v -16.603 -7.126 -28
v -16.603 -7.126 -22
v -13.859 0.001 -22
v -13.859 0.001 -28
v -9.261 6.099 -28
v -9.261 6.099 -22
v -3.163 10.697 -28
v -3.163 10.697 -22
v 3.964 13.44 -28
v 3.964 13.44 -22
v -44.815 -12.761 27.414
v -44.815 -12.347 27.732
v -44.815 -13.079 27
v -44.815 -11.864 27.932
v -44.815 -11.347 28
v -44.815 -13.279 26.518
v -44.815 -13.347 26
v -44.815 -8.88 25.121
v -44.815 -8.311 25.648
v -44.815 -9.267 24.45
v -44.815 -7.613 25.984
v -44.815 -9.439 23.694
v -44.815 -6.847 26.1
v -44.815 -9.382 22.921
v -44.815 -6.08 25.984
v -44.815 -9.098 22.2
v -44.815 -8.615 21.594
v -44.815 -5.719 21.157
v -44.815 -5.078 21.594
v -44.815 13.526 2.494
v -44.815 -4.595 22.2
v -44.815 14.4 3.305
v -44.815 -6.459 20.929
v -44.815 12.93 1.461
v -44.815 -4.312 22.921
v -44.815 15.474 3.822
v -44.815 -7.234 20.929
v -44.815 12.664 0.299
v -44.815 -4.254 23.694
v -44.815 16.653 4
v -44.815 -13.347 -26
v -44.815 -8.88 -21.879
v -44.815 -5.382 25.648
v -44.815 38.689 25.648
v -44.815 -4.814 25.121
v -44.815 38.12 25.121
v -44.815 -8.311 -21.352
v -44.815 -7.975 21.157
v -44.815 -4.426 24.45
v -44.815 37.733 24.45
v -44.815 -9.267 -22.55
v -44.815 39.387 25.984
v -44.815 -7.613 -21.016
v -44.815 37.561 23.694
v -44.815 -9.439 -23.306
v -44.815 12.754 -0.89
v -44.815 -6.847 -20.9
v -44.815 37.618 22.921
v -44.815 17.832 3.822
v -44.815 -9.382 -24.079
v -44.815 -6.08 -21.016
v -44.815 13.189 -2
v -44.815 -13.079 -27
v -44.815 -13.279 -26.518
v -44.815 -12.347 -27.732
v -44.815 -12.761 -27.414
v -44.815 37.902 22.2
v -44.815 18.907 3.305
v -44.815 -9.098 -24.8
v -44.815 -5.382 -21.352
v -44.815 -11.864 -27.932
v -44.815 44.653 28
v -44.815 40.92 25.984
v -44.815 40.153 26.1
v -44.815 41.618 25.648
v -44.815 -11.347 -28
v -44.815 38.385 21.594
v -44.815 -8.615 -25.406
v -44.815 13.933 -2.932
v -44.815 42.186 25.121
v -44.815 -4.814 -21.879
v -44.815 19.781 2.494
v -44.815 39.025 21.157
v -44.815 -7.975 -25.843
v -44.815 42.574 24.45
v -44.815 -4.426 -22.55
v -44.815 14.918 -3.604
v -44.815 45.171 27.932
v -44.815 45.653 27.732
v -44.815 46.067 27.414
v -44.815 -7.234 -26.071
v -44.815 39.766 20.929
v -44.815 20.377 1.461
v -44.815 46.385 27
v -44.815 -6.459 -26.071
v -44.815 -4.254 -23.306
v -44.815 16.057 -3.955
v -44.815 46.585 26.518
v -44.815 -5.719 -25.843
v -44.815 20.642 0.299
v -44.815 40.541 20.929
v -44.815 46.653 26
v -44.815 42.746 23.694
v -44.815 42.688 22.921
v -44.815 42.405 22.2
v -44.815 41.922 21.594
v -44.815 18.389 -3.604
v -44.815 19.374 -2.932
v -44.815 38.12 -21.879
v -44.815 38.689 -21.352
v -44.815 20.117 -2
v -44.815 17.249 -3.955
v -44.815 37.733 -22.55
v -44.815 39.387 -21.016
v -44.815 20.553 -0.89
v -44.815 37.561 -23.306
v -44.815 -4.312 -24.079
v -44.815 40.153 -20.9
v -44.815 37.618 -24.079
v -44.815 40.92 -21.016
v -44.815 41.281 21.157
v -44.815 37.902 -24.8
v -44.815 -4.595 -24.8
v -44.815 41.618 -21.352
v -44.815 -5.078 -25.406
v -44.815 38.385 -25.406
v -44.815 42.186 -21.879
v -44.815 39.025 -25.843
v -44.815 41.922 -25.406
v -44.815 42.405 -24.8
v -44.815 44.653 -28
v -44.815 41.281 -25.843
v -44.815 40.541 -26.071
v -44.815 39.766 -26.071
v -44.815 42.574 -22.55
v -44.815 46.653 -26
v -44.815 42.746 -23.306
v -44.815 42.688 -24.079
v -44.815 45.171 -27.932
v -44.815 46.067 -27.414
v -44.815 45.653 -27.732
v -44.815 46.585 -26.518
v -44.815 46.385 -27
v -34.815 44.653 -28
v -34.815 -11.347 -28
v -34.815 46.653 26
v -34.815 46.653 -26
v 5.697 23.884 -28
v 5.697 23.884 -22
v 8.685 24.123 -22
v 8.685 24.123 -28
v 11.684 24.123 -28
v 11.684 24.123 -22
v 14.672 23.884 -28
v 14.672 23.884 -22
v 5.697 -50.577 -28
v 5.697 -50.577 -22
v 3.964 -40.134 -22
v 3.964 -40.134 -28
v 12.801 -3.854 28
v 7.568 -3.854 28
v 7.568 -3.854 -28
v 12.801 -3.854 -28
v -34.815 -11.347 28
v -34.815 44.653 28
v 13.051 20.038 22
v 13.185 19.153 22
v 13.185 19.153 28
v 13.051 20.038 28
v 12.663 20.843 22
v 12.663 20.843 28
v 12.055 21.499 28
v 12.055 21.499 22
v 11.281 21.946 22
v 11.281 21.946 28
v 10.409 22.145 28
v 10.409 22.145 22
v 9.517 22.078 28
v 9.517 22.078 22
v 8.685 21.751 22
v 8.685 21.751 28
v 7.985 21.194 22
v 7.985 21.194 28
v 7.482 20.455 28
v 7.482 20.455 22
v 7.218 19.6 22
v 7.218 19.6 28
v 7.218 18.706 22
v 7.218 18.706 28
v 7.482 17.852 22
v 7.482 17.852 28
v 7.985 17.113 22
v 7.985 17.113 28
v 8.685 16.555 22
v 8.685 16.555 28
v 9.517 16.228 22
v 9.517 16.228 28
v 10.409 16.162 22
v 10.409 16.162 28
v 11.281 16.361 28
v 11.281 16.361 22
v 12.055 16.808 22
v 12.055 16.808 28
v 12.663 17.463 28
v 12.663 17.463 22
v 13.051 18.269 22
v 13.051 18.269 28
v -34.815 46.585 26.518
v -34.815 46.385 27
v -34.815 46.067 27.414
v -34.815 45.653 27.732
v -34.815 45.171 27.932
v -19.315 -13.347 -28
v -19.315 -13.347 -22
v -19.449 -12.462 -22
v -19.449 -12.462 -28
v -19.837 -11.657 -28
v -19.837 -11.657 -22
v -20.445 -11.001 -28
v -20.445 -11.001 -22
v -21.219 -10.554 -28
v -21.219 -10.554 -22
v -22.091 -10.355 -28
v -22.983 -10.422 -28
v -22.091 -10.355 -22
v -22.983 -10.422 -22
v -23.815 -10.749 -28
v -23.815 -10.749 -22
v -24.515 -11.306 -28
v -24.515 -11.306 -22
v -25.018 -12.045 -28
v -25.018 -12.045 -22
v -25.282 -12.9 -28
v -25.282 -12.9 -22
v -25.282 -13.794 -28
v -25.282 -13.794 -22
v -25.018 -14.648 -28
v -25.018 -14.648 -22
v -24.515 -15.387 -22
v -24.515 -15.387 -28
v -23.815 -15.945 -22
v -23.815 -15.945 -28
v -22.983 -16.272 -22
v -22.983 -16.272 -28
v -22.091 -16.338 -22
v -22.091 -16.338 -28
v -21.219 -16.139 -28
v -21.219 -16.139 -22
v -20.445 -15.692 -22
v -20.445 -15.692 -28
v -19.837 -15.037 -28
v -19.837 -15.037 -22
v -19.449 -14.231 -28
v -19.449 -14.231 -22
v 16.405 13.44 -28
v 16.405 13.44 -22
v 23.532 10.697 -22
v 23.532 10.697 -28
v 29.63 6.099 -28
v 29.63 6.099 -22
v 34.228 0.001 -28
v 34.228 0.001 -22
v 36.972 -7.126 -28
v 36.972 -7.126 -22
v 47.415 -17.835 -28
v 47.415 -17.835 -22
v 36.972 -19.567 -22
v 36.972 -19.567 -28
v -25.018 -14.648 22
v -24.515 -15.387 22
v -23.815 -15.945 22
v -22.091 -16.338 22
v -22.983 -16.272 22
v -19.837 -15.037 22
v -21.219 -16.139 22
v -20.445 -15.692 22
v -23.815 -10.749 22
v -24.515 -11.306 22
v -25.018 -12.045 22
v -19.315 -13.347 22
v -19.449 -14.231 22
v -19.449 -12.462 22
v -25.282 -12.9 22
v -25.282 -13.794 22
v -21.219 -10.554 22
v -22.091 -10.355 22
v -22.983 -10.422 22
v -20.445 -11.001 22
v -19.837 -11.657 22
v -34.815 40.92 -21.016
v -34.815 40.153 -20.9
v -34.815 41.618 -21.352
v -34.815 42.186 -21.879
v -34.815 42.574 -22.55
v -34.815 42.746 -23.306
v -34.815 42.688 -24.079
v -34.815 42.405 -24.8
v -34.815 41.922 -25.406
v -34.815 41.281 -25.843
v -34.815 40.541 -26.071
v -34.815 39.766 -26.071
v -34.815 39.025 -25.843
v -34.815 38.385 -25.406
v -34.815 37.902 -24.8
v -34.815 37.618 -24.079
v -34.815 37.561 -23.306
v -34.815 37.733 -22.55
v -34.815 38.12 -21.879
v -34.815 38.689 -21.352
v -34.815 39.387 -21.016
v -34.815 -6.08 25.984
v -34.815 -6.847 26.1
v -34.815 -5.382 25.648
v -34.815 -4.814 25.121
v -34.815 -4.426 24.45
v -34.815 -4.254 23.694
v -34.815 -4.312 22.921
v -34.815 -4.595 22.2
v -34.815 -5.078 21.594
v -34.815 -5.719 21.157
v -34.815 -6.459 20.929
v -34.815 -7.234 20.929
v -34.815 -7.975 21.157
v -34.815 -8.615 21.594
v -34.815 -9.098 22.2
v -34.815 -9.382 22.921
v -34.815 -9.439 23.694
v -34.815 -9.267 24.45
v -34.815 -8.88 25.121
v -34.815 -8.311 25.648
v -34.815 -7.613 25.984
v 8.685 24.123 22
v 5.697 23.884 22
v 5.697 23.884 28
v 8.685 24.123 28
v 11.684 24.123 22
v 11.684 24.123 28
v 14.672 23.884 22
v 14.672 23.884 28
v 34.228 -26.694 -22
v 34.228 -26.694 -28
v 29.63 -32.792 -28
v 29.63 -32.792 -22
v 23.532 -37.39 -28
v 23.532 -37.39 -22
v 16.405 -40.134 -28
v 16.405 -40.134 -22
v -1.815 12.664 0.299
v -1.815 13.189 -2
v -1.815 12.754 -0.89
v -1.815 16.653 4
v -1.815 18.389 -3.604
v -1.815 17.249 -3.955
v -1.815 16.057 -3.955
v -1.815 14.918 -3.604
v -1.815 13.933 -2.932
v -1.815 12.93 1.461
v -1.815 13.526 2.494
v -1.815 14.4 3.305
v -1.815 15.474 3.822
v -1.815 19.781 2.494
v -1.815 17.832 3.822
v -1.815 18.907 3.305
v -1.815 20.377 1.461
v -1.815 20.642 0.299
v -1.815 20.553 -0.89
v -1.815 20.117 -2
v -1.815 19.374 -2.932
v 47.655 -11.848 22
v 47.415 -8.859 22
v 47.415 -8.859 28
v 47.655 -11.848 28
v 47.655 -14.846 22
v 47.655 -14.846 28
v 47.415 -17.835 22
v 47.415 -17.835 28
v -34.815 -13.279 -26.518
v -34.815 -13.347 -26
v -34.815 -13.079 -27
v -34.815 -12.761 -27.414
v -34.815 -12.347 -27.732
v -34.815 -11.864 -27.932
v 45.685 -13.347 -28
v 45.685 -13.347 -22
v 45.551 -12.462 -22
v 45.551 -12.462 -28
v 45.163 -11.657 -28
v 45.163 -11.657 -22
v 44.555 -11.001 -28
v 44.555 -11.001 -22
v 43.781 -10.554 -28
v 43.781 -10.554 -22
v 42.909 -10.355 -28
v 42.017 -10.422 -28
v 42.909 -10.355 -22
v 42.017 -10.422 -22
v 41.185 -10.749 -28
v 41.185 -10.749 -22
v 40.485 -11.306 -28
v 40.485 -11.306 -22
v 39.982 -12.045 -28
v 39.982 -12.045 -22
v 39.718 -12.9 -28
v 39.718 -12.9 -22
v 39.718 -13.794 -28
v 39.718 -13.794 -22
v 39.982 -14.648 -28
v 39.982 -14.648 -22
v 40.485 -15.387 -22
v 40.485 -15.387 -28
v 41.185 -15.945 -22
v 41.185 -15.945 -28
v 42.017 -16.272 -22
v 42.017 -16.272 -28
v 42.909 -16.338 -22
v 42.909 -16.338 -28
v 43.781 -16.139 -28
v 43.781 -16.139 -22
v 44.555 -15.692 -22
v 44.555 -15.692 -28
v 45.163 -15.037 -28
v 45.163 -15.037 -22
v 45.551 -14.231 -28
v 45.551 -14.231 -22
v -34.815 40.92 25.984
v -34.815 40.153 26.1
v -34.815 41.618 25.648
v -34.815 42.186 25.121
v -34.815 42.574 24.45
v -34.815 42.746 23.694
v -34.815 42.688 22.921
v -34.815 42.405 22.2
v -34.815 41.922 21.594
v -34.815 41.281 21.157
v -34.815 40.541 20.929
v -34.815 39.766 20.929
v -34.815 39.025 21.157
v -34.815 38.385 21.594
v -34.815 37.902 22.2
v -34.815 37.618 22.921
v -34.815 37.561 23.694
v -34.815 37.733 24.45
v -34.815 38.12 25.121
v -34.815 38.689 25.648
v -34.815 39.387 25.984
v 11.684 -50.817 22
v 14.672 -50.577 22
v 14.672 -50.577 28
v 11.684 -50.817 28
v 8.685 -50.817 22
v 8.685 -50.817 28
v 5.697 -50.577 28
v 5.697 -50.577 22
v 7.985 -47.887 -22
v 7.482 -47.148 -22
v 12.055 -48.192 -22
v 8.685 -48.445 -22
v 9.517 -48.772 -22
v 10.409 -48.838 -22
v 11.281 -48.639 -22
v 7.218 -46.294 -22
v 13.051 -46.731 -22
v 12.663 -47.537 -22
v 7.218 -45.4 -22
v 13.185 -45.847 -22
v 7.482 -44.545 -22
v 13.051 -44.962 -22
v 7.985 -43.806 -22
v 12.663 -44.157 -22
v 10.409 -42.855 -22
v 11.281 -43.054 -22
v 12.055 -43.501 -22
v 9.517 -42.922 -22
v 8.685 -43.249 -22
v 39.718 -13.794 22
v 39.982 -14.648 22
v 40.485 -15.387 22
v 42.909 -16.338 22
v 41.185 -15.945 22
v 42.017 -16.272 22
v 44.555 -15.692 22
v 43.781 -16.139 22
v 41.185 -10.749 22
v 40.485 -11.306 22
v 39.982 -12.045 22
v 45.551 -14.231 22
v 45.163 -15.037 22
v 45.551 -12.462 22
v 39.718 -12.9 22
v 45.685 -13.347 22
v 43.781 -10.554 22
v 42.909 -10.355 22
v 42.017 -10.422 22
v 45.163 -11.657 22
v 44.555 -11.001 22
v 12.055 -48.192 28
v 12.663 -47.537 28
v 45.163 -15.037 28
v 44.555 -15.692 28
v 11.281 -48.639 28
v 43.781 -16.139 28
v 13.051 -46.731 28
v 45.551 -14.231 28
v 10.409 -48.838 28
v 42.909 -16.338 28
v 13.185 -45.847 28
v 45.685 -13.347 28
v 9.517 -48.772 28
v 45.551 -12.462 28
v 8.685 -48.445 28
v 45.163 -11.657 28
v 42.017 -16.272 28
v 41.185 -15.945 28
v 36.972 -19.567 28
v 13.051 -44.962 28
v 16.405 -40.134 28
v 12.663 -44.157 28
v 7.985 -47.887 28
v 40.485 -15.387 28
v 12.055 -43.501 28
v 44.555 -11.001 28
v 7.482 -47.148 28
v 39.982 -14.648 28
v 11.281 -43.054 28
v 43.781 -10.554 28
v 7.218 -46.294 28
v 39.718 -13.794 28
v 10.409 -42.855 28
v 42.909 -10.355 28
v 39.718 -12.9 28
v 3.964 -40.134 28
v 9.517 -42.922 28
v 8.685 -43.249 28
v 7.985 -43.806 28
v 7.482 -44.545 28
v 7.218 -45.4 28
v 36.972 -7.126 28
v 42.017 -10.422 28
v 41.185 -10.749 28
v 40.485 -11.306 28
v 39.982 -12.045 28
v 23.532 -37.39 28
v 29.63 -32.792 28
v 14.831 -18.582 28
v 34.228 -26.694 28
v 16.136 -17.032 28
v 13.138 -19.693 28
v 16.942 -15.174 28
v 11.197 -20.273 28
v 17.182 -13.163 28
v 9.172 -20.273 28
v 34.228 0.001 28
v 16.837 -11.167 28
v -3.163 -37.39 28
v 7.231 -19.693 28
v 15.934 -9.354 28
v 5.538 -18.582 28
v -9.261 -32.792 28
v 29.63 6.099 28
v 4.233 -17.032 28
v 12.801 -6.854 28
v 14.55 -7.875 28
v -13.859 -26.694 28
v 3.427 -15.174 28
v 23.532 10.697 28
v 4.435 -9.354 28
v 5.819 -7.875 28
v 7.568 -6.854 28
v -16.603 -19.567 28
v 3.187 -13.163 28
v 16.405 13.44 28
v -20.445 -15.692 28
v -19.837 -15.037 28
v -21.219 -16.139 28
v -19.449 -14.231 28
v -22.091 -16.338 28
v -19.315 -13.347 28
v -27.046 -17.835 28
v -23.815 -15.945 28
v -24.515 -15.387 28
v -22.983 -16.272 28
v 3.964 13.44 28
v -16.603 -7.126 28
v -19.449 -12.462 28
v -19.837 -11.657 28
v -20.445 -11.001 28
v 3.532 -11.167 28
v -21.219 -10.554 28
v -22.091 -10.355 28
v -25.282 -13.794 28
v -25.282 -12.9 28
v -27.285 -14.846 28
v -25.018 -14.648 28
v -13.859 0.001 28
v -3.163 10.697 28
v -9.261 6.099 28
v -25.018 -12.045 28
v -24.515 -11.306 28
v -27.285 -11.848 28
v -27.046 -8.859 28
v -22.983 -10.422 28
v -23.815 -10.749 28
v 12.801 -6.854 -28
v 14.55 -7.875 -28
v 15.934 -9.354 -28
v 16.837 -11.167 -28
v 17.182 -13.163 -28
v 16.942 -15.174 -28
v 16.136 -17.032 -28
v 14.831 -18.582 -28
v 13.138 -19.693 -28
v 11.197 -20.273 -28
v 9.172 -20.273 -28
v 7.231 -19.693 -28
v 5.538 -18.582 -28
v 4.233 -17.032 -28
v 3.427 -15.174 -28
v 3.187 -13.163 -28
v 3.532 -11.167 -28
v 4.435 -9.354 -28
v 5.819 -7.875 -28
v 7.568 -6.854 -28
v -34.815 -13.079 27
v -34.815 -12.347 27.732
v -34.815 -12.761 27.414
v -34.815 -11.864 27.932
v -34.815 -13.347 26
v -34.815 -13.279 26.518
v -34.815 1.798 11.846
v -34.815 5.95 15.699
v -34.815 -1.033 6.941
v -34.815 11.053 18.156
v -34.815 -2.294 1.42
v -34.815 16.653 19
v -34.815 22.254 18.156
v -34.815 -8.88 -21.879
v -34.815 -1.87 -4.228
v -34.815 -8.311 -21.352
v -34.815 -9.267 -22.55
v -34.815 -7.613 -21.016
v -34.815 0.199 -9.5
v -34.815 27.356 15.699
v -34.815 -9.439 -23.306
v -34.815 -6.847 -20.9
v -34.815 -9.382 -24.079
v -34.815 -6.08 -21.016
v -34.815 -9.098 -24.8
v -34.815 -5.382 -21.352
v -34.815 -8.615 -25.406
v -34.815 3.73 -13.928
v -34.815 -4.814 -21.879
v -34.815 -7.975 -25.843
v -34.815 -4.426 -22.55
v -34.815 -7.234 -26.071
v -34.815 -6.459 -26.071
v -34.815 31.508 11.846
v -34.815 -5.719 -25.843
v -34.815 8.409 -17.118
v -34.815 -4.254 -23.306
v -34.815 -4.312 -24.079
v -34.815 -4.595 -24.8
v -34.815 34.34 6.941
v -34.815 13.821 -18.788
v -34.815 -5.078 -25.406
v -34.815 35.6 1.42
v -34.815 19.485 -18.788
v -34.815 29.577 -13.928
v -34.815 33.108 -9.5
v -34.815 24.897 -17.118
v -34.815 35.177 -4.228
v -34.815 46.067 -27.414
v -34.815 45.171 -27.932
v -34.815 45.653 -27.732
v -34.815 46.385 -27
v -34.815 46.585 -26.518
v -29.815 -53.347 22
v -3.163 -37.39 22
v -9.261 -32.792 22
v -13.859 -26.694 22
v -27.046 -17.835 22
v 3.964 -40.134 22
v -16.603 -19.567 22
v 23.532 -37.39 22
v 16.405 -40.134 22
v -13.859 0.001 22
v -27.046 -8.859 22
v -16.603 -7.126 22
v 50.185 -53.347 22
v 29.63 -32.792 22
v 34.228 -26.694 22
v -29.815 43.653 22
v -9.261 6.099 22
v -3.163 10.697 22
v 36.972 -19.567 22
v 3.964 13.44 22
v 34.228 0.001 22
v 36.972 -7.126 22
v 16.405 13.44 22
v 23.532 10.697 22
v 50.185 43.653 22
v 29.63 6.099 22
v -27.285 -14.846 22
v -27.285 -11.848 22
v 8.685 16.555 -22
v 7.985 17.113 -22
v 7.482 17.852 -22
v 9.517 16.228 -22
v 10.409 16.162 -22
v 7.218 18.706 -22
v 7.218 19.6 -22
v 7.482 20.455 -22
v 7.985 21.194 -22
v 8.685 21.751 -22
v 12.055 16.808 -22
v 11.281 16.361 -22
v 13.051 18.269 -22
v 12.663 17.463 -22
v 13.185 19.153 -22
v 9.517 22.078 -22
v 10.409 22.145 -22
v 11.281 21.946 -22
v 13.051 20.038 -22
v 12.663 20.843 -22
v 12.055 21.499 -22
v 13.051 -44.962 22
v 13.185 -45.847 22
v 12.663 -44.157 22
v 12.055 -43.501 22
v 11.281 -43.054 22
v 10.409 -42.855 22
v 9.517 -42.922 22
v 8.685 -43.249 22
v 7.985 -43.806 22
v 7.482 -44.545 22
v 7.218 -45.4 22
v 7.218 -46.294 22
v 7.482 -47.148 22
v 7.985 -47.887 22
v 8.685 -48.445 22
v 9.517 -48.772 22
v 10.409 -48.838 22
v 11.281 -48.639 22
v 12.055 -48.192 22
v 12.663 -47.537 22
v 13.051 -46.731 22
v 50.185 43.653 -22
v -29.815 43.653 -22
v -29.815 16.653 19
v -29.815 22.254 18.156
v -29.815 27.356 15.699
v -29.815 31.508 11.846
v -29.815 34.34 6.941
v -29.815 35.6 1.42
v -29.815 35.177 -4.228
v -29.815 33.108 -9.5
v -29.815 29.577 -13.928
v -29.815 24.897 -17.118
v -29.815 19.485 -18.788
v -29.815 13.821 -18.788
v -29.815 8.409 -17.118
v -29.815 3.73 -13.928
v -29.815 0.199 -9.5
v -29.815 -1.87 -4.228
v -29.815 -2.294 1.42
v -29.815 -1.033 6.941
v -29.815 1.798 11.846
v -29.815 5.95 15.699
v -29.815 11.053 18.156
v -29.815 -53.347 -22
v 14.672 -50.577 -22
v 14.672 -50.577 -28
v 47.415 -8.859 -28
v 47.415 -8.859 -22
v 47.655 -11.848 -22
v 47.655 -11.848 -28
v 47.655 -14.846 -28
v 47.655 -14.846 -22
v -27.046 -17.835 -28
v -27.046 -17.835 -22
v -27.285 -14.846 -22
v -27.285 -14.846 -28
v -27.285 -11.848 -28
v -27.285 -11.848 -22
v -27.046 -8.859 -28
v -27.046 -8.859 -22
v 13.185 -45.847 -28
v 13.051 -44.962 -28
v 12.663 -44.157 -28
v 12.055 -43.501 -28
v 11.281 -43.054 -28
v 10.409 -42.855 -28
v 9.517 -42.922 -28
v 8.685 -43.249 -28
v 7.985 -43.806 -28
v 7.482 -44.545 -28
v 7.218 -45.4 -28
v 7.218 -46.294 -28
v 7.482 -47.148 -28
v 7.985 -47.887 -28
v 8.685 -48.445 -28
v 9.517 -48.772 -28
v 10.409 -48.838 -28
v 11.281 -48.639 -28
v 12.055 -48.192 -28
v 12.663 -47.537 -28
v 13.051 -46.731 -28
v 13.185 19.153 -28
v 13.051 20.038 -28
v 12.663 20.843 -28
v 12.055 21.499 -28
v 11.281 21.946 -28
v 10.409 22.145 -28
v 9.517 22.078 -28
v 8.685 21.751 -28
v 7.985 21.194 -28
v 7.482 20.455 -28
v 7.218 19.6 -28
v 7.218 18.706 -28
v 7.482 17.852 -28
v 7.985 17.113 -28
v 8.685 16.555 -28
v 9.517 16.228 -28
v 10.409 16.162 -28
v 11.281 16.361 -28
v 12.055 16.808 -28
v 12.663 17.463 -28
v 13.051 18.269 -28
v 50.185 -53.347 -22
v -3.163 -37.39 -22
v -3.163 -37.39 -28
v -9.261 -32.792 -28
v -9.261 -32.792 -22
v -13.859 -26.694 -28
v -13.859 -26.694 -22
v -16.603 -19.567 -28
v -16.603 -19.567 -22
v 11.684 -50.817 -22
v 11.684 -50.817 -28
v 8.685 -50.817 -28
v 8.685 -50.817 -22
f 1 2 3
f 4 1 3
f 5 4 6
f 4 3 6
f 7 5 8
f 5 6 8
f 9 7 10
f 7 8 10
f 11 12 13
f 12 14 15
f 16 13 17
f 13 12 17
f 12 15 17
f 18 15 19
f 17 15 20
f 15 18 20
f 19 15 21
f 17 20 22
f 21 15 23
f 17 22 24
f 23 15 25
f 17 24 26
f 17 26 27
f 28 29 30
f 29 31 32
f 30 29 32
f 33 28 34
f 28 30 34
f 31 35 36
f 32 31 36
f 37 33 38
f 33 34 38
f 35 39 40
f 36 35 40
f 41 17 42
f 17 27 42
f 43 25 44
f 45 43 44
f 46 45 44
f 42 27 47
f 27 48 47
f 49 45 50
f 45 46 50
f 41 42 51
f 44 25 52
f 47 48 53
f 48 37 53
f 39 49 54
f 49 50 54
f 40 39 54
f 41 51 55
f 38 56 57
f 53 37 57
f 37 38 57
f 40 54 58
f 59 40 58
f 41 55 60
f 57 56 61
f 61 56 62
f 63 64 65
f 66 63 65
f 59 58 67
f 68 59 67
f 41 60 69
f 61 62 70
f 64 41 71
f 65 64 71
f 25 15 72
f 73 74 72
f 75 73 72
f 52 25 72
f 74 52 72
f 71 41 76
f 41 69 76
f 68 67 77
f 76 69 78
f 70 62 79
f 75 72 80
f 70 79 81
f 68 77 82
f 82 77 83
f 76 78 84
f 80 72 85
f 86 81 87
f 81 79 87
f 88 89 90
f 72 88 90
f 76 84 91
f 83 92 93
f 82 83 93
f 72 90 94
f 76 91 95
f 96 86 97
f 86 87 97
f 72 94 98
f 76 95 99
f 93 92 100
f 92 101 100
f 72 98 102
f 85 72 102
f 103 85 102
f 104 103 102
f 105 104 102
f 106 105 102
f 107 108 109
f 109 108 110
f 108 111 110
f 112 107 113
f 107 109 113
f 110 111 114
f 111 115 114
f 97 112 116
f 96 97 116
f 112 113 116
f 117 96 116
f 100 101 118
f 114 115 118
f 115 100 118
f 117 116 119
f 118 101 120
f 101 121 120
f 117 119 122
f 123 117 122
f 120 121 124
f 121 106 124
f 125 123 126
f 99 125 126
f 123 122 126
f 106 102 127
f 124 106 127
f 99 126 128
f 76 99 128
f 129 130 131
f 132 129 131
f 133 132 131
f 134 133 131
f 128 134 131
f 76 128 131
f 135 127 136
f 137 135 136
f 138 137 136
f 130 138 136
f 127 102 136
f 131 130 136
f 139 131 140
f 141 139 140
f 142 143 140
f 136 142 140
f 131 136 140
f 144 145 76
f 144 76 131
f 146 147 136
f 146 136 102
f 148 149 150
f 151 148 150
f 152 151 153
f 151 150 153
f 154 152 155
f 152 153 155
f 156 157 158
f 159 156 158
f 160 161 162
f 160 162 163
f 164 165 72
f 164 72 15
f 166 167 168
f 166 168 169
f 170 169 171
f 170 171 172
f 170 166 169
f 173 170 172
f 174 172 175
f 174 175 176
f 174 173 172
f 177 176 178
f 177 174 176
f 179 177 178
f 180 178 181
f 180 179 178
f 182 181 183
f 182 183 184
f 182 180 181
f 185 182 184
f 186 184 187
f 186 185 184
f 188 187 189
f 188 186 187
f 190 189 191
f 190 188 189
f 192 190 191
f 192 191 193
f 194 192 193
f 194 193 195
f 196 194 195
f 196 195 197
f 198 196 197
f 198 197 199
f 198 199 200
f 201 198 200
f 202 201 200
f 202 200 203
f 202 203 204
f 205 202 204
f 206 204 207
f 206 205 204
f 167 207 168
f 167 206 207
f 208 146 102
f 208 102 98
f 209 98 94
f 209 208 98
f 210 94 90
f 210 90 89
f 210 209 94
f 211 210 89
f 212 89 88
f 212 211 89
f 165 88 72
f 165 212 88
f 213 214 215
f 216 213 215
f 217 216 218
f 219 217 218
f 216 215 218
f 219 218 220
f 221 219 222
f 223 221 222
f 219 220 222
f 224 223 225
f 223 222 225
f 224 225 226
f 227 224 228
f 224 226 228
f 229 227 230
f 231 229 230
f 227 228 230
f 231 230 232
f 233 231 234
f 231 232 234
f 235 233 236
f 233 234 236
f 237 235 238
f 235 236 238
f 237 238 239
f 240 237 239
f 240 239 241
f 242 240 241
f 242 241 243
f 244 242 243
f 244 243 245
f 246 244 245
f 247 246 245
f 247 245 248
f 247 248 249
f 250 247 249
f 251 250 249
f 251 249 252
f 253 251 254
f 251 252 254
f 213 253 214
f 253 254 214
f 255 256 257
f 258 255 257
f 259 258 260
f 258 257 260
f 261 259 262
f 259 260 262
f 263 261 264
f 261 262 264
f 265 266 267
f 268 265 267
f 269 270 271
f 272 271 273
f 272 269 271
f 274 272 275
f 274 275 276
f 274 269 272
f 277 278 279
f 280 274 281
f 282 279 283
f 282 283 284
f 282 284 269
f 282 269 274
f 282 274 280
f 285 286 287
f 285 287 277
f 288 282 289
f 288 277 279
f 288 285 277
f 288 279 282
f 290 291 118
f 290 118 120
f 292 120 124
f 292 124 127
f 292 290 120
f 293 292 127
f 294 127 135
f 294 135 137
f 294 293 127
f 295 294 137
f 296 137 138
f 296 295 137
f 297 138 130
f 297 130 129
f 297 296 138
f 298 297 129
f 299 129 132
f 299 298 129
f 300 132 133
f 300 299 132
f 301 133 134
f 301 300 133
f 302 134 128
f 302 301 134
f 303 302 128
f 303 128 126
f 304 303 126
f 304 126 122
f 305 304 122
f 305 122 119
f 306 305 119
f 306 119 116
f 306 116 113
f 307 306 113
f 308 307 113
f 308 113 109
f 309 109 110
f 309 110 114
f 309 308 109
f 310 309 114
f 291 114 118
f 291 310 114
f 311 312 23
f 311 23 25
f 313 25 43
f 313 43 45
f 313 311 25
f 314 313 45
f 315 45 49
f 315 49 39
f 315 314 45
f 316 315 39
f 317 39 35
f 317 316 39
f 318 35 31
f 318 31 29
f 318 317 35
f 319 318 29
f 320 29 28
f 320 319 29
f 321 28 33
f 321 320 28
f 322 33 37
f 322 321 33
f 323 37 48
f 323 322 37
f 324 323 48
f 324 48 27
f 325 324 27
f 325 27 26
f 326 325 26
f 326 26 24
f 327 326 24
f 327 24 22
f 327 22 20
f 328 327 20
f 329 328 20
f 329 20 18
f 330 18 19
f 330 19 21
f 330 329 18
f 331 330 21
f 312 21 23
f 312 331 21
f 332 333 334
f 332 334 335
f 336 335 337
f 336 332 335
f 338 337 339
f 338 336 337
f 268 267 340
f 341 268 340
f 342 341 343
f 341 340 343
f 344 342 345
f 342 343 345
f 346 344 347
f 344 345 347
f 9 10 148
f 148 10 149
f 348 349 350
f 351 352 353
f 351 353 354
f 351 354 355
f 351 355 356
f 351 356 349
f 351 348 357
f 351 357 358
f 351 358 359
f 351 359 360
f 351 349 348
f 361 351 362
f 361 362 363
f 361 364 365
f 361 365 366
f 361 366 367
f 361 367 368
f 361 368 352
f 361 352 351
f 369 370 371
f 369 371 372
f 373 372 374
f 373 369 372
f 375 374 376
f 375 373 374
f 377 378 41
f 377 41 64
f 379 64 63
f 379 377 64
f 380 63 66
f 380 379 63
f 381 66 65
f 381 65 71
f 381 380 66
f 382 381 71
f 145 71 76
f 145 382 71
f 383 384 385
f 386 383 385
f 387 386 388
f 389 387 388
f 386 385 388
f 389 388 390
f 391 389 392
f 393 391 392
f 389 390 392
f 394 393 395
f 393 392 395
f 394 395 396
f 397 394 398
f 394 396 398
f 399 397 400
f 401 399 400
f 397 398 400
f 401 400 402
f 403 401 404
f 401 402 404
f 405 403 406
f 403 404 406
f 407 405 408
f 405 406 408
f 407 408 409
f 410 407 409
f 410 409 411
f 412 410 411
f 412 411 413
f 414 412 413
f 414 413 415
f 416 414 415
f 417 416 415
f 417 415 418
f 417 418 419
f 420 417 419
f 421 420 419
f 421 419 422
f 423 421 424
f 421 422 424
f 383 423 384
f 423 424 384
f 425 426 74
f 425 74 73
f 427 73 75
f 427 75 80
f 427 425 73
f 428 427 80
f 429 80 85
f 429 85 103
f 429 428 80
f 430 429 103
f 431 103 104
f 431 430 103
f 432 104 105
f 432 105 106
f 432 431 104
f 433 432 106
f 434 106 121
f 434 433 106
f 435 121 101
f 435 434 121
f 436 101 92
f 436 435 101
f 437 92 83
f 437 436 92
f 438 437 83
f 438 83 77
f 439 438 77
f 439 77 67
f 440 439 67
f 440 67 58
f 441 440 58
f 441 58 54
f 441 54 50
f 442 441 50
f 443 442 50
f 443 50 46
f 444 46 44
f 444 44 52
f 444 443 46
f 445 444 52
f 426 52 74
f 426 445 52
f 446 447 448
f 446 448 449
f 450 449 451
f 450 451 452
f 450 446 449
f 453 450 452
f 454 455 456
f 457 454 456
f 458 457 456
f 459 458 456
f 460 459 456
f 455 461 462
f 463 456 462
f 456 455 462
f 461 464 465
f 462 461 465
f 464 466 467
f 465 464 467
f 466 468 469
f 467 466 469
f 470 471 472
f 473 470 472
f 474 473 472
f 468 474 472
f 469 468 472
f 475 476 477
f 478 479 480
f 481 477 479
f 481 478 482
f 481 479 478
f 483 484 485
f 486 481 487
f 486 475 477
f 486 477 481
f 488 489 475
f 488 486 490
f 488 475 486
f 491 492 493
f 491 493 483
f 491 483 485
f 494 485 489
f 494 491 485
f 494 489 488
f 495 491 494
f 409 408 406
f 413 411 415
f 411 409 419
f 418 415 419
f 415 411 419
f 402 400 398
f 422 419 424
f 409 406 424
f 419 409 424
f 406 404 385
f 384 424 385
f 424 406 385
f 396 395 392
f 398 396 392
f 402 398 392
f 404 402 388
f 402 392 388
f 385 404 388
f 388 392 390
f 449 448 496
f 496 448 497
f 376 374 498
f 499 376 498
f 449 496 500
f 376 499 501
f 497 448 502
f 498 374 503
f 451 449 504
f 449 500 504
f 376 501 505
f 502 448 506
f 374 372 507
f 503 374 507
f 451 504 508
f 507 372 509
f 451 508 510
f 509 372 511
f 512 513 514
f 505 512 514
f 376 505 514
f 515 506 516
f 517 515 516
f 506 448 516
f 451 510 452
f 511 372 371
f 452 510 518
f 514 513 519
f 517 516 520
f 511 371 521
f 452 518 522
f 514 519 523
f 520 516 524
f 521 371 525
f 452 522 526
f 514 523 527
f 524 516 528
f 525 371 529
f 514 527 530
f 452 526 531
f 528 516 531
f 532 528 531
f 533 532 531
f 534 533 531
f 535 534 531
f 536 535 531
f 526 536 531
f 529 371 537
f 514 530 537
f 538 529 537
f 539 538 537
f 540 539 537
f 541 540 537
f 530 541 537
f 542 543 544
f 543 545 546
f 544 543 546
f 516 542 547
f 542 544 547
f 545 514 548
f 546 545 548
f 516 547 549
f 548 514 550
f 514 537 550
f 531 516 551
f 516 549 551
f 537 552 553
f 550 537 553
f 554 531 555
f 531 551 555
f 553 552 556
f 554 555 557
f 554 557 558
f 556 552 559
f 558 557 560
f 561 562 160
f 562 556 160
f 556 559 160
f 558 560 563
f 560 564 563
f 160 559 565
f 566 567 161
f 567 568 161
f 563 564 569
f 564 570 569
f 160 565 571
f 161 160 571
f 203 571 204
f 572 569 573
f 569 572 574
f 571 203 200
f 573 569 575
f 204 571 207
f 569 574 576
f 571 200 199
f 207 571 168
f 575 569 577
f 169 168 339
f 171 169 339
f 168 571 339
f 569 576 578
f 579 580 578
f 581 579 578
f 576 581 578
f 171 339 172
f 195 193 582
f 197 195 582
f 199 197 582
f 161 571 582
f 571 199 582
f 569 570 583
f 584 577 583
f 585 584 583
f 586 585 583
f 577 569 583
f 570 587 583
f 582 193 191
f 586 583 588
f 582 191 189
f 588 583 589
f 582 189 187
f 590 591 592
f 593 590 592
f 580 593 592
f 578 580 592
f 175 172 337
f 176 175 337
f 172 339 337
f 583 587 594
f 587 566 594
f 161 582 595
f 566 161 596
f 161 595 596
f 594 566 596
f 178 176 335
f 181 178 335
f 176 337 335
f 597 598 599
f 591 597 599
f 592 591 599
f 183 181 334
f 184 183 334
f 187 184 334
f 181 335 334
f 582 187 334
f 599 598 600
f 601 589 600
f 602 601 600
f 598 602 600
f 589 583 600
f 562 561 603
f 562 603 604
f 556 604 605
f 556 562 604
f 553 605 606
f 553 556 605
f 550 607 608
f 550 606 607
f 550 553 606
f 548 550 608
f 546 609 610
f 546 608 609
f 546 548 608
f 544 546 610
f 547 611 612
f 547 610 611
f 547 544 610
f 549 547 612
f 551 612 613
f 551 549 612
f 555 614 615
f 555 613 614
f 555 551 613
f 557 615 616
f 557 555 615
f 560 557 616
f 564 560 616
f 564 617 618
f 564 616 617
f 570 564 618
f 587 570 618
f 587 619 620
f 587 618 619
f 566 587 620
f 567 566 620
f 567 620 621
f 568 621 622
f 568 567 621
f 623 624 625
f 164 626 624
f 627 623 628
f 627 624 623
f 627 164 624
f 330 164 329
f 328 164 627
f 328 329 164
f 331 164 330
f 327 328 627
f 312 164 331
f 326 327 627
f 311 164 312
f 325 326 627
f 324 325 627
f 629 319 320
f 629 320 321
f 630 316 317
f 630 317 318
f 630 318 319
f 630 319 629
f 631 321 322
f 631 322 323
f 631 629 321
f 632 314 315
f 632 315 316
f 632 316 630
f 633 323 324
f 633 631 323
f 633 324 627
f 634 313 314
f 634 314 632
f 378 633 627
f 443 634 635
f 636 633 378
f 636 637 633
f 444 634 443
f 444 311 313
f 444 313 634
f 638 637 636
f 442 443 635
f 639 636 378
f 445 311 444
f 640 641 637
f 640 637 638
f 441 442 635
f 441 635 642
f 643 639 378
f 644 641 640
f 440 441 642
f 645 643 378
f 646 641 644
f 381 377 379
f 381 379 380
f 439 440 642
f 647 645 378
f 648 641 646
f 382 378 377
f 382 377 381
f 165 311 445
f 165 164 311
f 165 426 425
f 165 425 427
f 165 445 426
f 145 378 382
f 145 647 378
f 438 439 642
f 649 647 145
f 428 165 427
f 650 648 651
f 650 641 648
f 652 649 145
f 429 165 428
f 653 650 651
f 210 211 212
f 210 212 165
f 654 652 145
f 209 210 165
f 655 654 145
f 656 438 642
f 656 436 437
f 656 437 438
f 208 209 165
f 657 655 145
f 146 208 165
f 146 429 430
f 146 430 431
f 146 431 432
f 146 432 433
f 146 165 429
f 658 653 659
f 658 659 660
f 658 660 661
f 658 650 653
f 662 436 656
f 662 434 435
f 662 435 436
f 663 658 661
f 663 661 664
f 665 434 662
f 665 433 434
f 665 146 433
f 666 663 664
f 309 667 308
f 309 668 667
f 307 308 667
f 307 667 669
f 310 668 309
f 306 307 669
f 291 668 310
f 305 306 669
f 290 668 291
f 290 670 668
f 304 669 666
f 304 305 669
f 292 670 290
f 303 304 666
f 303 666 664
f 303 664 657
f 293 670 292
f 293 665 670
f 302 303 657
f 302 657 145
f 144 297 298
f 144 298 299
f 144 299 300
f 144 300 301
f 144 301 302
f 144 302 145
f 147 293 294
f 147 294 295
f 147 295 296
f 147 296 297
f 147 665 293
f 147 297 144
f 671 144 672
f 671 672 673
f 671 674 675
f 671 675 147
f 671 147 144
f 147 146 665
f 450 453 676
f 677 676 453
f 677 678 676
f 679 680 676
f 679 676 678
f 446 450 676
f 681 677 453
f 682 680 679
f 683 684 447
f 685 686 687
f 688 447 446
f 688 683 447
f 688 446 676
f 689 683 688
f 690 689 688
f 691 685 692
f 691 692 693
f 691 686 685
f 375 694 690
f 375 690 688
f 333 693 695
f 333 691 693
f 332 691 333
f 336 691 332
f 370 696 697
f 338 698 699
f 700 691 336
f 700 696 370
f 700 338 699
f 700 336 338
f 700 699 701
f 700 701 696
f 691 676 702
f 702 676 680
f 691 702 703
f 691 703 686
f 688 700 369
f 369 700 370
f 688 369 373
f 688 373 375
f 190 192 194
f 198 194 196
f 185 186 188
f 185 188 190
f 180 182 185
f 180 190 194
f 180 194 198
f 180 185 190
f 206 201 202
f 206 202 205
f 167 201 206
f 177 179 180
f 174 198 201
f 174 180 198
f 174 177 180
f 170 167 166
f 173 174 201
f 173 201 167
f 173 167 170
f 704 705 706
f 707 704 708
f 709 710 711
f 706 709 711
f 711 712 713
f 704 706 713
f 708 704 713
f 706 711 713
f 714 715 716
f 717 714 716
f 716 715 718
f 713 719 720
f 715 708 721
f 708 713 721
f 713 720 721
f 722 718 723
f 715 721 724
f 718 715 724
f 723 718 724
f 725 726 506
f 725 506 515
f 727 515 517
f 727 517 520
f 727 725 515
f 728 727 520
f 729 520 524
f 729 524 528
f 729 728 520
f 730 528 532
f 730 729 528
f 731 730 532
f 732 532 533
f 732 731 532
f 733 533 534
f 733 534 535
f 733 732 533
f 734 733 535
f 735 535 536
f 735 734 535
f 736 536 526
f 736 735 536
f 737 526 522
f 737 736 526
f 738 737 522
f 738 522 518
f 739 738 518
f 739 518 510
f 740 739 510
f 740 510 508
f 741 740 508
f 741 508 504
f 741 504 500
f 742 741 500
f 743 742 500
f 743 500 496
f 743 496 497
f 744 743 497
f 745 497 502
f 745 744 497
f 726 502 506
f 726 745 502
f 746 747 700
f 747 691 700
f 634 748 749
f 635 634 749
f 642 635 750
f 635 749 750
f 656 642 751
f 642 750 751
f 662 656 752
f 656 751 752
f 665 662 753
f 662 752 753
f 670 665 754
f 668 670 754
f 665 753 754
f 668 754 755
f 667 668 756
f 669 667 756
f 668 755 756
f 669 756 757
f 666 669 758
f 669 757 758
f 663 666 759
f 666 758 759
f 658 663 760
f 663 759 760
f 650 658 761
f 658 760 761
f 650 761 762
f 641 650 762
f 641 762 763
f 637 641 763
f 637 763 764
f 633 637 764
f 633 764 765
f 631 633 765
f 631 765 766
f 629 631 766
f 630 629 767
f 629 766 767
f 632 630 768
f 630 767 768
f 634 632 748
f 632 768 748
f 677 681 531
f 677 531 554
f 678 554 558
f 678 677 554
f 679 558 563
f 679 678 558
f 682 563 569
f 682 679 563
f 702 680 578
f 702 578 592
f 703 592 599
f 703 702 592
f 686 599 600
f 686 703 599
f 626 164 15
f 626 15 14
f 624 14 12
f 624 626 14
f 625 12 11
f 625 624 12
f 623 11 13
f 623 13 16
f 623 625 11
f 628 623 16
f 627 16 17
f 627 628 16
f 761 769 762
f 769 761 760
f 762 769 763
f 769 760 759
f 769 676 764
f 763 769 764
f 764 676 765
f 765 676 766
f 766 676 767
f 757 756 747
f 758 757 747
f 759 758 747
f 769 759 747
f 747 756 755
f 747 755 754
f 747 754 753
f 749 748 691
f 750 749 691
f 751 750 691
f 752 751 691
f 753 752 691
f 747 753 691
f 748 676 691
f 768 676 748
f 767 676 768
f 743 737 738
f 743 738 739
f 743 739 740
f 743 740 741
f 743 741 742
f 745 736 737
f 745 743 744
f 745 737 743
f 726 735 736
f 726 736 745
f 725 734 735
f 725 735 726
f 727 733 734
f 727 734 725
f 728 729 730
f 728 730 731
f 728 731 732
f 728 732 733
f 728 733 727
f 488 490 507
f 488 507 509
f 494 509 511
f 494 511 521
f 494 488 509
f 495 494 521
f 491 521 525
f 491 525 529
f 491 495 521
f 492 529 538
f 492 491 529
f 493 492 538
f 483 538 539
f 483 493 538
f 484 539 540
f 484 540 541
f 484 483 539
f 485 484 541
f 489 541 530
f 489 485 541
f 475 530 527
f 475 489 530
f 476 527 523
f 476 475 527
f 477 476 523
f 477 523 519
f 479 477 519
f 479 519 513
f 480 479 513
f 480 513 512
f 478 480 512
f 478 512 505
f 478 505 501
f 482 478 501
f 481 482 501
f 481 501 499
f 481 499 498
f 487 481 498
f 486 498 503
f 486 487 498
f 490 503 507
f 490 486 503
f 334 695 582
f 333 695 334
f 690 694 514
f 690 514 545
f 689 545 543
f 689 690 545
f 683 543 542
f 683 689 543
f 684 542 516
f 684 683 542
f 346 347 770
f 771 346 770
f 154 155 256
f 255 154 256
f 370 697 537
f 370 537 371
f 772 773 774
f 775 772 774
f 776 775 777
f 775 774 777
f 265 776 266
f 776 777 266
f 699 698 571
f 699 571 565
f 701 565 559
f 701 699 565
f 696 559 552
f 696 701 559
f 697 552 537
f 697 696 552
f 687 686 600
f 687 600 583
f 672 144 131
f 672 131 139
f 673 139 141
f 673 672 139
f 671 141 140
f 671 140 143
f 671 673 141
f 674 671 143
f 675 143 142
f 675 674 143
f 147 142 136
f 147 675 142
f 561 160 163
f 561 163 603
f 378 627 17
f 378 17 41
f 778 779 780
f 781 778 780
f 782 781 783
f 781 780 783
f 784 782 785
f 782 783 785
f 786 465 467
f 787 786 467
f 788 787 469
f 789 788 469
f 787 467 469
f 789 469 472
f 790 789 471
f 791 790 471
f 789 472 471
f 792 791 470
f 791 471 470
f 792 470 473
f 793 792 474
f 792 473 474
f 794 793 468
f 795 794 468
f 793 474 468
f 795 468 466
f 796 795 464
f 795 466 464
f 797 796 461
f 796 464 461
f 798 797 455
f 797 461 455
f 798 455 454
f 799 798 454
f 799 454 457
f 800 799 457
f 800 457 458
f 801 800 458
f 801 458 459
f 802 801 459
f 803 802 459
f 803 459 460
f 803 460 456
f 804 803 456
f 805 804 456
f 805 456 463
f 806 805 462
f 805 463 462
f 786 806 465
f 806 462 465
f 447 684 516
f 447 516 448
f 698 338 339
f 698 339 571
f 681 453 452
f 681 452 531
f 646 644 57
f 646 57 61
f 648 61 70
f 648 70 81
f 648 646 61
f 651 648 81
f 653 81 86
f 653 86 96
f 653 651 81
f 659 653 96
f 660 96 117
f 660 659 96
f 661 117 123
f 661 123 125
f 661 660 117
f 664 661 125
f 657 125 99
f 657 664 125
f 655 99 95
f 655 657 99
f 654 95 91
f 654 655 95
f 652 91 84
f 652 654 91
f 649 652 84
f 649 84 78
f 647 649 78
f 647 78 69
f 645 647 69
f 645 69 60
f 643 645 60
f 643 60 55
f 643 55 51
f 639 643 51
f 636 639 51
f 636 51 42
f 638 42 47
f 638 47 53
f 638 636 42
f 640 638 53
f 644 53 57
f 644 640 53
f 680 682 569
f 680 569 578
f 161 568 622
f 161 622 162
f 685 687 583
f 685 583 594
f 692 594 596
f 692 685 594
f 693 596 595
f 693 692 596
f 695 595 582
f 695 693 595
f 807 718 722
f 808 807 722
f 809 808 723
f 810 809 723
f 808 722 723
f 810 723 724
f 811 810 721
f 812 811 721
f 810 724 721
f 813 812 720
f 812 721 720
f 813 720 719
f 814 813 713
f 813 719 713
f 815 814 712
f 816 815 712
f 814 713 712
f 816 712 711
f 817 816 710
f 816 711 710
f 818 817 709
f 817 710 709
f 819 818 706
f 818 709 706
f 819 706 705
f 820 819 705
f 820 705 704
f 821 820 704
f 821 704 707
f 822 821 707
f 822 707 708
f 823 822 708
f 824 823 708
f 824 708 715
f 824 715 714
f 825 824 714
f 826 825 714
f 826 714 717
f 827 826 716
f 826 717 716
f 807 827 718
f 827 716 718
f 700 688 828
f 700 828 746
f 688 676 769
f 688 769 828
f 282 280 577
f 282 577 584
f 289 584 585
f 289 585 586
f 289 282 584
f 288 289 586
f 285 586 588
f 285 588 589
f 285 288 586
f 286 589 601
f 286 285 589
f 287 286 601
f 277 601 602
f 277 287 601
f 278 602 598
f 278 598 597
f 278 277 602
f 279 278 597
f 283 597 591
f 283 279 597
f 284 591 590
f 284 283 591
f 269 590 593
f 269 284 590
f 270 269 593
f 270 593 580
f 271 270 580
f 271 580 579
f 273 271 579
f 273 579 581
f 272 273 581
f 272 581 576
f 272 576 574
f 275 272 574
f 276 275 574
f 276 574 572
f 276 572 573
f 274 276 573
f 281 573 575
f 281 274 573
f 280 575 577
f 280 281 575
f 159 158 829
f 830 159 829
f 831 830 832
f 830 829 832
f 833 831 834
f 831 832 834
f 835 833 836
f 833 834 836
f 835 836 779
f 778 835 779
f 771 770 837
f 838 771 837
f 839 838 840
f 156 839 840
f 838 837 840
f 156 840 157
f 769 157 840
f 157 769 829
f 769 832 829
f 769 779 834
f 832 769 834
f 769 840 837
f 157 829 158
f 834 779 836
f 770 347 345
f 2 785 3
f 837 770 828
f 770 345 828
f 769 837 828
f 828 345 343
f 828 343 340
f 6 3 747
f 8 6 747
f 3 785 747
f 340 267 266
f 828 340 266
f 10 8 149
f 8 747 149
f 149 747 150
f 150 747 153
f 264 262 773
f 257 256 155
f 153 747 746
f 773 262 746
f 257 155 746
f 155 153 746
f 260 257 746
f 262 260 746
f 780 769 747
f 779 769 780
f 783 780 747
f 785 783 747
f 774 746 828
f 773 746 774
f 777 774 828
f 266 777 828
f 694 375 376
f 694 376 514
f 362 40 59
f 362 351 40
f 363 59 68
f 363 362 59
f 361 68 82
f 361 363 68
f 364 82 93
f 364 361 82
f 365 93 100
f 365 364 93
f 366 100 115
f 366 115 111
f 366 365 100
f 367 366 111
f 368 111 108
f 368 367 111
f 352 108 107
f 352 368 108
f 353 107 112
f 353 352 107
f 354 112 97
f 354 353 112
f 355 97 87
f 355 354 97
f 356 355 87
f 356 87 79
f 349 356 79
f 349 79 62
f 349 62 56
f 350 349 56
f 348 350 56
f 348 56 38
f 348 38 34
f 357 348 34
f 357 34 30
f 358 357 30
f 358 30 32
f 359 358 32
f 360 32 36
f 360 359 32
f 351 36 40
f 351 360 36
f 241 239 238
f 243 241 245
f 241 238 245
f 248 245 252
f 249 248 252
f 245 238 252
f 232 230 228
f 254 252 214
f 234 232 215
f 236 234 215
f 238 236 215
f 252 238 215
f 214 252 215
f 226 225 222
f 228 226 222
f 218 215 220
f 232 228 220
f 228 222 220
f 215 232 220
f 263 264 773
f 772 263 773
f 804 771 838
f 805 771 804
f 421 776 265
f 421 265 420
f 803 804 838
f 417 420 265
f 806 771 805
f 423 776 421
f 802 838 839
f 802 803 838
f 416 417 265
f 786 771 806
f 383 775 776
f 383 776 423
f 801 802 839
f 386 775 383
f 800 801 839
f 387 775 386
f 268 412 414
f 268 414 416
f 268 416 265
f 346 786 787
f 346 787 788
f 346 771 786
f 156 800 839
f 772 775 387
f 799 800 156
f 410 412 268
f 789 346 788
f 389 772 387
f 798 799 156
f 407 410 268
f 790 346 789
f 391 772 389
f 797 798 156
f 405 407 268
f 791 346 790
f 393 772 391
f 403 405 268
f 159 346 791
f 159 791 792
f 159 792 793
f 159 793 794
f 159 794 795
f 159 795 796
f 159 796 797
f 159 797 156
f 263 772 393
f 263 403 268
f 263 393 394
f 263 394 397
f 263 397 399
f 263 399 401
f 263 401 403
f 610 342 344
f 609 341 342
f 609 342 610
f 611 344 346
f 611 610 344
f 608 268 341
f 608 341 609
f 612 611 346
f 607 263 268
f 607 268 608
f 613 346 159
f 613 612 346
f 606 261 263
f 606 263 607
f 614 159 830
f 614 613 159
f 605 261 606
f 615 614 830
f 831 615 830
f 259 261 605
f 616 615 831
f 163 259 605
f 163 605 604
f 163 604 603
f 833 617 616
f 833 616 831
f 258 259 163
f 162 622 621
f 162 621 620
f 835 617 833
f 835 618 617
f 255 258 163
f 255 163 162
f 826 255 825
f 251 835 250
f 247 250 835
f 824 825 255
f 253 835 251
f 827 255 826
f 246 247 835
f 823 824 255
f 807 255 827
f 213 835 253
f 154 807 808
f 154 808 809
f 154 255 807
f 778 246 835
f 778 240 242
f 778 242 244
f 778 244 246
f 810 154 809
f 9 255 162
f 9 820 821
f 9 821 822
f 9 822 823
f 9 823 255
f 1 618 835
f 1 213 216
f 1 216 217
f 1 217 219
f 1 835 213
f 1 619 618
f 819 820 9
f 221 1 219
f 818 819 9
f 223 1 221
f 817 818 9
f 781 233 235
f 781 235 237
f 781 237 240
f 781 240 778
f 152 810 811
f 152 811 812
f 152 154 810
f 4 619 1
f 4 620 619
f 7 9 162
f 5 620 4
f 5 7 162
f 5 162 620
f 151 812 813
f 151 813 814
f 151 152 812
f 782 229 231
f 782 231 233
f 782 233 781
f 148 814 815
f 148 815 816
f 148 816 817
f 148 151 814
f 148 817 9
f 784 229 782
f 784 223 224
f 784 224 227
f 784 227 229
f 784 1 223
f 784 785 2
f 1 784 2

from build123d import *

# Parameters (mm, degrees)
EXTRUDE_1_DEPTH      = 22
EXTRUDE_1_DEPTH_BACK = 22
SKETCH_1_W           = 80
SKETCH_1_H           = 97
SKETCH_2_R           = 3
EXTRUDE_2_DEPTH      = 6
CUT_EXTRUDE_1_DEPTH  = 116
SKETCH_4_R           = 19
SKETCH_4_R_2         = 4
EXTRUDE_3_DEPTH      = 5
SKETCH_5_R           = 2.6
SKETCH_5_R_2         = 4
EXTRUDE_4_DEPTH      = 10
CUT_EXTRUDE_START    = -28
SKETCH_6_R           = 4
CUT_EXTRUDE_2_DEPTH  = 28


with BuildPart() as part:
    # 草图1 → 凸台-拉伸1 (new, two sides: drawn at the far end of the back side and taken through both)
    with BuildSketch(Plane.XY.offset(-EXTRUDE_1_DEPTH_BACK)):
        with Locations((10.184545044, -4.84675016)):
            Rectangle(SKETCH_1_W, SKETCH_1_H)
    extrude(amount=EXTRUDE_1_DEPTH + EXTRUDE_1_DEPTH_BACK)

    # 草图2 → 凸台-拉伸2 (add)
    with BuildSketch(Plane.XY.offset(22)):
        with BuildLine():
            Line((5.696739445, -50.577243051), (3.963993083, -40.133962282))
            ThreePointArc((3.963993083, -40.133962282), (-9.260891439, -32.792186642), (-16.602667079, -19.56730212))
            Line((-16.602667079, -19.56730212), (-27.045947847, -17.834555759))
            ThreePointArc((-27.045947847, -17.834555759), (-27.315454956, -13.34675016), (-27.045947847, -8.858944561))
            Line((-27.045947847, -8.858944561), (-16.602667079, -7.126198199))
            ThreePointArc((-16.602667079, -7.126198199), (-9.260891439, 6.098686323), (3.963993083, 13.440461963))
            Line((3.963993083, 13.440461963), (5.696739445, 23.883742731))
            ThreePointArc((5.696739445, 23.883742731), (10.184545044, 24.15324984), (14.672350643, 23.883742731))
            Line((14.672350643, 23.883742731), (16.405097004, 13.440461963))
            ThreePointArc((16.405097004, 13.440461963), (29.629981526, 6.098686323), (36.971757166, -7.126198199))
            Line((36.971757166, -7.126198199), (47.415037935, -8.858944561))
            ThreePointArc((47.415037935, -8.858944561), (47.684545044, -13.34675016), (47.415037935, -17.834555759))
            Line((47.415037935, -17.834555759), (36.971757166, -19.56730212))
            ThreePointArc((36.971757166, -19.56730212), (29.629981526, -32.792186642), (16.405097004, -40.133962282))
            Line((16.405097004, -40.133962282), (14.672350643, -50.577243051))
            ThreePointArc((14.672350643, -50.577243051), (10.184545044, -50.84675016), (5.696739445, -50.577243051))
        make_face()
        with Locations((10.184545044, -45.84675016)):
            Circle(SKETCH_2_R, mode=Mode.SUBTRACT)
        with Locations((-22.315454956, -13.34675016)):
            Circle(SKETCH_2_R, mode=Mode.SUBTRACT)
        with Locations((10.184545044, 19.15324984)):
            Circle(SKETCH_2_R, mode=Mode.SUBTRACT)
        with Locations((42.684545044, -13.34675016)):
            Circle(SKETCH_2_R, mode=Mode.SUBTRACT)
    extrude_2 = extrude(amount=EXTRUDE_2_DEPTH)

    # 镜向1: 凸台-拉伸2 across plane
    add(extrude_2.mirror(Plane.XY))

    # 草图3 → 切除-拉伸1 (cut)
    with BuildSketch(Plane.XY.offset(28)):
        with BuildLine():
            Line((7.568069443, -6.854134706), (7.568069443, -3.854134706))
            Line((7.568069443, -3.854134706), (12.801020645, -3.854134706))
            Line((12.801020645, -3.854134706), (12.801020645, -6.854134706))
            ThreePointArc((12.801020645, -6.854134706), (10.184545044, -20.34675016), (7.568069443, -6.854134706))
        make_face()
    extrude(amount=-CUT_EXTRUDE_1_DEPTH, mode=Mode.SUBTRACT)

    # 草图4 → 凸台-拉伸3 (add)
    with BuildSketch(Plane.ZY.offset(29.815454956)):
        with Locations((0, 16.65324984)):
            Circle(SKETCH_4_R)
        with Locations((0, 16.65324984)):
            Circle(SKETCH_4_R_2, mode=Mode.SUBTRACT)
    extrude(amount=EXTRUDE_3_DEPTH)

    # 草图5 → 凸台-拉伸4 (add)
    with BuildSketch(Plane.ZY.offset(34.815454956)):
        with BuildLine():
            Line((-26, 46.65324984), (26, 46.65324984))
            ThreePointArc((26, 46.65324984), (27.414213562, 46.067463403), (28, 44.65324984))
            Line((28, 44.65324984), (28, -11.34675016))
            ThreePointArc((28, -11.34675016), (27.414213562, -12.760963722), (26, -13.34675016))
            Line((26, -13.34675016), (-26, -13.34675016))
            ThreePointArc((-26, -13.34675016), (-27.414213562, -12.760963722), (-28, -11.34675016))
            Line((-28, -11.34675016), (-28, 44.65324984))
            ThreePointArc((-28, 44.65324984), (-27.414213562, 46.067463403), (-26, 46.65324984))
        make_face()
        with Locations((23.5, 40.15324984)):
            Circle(SKETCH_5_R, mode=Mode.SUBTRACT)
        with Locations((-23.5, 40.15324984)):
            Circle(SKETCH_5_R, mode=Mode.SUBTRACT)
        with Locations((23.5, -6.84675016)):
            Circle(SKETCH_5_R, mode=Mode.SUBTRACT)
        with Locations((-23.5, -6.84675016)):
            Circle(SKETCH_5_R, mode=Mode.SUBTRACT)
        with Locations((0, 16.65324984)):
            Circle(SKETCH_5_R_2, mode=Mode.SUBTRACT)
    extrude(amount=EXTRUDE_4_DEPTH)

    # 草图6 → 切除-拉伸2 (cut)
    with BuildSketch(Plane.ZY.offset(29.815454956).offset(CUT_EXTRUDE_START)):
        with Locations((0, 16.65324984)):
            Circle(SKETCH_6_R)
    extrude(amount=CUT_EXTRUDE_2_DEPTH, mode=Mode.SUBTRACT)


solid = part.part
